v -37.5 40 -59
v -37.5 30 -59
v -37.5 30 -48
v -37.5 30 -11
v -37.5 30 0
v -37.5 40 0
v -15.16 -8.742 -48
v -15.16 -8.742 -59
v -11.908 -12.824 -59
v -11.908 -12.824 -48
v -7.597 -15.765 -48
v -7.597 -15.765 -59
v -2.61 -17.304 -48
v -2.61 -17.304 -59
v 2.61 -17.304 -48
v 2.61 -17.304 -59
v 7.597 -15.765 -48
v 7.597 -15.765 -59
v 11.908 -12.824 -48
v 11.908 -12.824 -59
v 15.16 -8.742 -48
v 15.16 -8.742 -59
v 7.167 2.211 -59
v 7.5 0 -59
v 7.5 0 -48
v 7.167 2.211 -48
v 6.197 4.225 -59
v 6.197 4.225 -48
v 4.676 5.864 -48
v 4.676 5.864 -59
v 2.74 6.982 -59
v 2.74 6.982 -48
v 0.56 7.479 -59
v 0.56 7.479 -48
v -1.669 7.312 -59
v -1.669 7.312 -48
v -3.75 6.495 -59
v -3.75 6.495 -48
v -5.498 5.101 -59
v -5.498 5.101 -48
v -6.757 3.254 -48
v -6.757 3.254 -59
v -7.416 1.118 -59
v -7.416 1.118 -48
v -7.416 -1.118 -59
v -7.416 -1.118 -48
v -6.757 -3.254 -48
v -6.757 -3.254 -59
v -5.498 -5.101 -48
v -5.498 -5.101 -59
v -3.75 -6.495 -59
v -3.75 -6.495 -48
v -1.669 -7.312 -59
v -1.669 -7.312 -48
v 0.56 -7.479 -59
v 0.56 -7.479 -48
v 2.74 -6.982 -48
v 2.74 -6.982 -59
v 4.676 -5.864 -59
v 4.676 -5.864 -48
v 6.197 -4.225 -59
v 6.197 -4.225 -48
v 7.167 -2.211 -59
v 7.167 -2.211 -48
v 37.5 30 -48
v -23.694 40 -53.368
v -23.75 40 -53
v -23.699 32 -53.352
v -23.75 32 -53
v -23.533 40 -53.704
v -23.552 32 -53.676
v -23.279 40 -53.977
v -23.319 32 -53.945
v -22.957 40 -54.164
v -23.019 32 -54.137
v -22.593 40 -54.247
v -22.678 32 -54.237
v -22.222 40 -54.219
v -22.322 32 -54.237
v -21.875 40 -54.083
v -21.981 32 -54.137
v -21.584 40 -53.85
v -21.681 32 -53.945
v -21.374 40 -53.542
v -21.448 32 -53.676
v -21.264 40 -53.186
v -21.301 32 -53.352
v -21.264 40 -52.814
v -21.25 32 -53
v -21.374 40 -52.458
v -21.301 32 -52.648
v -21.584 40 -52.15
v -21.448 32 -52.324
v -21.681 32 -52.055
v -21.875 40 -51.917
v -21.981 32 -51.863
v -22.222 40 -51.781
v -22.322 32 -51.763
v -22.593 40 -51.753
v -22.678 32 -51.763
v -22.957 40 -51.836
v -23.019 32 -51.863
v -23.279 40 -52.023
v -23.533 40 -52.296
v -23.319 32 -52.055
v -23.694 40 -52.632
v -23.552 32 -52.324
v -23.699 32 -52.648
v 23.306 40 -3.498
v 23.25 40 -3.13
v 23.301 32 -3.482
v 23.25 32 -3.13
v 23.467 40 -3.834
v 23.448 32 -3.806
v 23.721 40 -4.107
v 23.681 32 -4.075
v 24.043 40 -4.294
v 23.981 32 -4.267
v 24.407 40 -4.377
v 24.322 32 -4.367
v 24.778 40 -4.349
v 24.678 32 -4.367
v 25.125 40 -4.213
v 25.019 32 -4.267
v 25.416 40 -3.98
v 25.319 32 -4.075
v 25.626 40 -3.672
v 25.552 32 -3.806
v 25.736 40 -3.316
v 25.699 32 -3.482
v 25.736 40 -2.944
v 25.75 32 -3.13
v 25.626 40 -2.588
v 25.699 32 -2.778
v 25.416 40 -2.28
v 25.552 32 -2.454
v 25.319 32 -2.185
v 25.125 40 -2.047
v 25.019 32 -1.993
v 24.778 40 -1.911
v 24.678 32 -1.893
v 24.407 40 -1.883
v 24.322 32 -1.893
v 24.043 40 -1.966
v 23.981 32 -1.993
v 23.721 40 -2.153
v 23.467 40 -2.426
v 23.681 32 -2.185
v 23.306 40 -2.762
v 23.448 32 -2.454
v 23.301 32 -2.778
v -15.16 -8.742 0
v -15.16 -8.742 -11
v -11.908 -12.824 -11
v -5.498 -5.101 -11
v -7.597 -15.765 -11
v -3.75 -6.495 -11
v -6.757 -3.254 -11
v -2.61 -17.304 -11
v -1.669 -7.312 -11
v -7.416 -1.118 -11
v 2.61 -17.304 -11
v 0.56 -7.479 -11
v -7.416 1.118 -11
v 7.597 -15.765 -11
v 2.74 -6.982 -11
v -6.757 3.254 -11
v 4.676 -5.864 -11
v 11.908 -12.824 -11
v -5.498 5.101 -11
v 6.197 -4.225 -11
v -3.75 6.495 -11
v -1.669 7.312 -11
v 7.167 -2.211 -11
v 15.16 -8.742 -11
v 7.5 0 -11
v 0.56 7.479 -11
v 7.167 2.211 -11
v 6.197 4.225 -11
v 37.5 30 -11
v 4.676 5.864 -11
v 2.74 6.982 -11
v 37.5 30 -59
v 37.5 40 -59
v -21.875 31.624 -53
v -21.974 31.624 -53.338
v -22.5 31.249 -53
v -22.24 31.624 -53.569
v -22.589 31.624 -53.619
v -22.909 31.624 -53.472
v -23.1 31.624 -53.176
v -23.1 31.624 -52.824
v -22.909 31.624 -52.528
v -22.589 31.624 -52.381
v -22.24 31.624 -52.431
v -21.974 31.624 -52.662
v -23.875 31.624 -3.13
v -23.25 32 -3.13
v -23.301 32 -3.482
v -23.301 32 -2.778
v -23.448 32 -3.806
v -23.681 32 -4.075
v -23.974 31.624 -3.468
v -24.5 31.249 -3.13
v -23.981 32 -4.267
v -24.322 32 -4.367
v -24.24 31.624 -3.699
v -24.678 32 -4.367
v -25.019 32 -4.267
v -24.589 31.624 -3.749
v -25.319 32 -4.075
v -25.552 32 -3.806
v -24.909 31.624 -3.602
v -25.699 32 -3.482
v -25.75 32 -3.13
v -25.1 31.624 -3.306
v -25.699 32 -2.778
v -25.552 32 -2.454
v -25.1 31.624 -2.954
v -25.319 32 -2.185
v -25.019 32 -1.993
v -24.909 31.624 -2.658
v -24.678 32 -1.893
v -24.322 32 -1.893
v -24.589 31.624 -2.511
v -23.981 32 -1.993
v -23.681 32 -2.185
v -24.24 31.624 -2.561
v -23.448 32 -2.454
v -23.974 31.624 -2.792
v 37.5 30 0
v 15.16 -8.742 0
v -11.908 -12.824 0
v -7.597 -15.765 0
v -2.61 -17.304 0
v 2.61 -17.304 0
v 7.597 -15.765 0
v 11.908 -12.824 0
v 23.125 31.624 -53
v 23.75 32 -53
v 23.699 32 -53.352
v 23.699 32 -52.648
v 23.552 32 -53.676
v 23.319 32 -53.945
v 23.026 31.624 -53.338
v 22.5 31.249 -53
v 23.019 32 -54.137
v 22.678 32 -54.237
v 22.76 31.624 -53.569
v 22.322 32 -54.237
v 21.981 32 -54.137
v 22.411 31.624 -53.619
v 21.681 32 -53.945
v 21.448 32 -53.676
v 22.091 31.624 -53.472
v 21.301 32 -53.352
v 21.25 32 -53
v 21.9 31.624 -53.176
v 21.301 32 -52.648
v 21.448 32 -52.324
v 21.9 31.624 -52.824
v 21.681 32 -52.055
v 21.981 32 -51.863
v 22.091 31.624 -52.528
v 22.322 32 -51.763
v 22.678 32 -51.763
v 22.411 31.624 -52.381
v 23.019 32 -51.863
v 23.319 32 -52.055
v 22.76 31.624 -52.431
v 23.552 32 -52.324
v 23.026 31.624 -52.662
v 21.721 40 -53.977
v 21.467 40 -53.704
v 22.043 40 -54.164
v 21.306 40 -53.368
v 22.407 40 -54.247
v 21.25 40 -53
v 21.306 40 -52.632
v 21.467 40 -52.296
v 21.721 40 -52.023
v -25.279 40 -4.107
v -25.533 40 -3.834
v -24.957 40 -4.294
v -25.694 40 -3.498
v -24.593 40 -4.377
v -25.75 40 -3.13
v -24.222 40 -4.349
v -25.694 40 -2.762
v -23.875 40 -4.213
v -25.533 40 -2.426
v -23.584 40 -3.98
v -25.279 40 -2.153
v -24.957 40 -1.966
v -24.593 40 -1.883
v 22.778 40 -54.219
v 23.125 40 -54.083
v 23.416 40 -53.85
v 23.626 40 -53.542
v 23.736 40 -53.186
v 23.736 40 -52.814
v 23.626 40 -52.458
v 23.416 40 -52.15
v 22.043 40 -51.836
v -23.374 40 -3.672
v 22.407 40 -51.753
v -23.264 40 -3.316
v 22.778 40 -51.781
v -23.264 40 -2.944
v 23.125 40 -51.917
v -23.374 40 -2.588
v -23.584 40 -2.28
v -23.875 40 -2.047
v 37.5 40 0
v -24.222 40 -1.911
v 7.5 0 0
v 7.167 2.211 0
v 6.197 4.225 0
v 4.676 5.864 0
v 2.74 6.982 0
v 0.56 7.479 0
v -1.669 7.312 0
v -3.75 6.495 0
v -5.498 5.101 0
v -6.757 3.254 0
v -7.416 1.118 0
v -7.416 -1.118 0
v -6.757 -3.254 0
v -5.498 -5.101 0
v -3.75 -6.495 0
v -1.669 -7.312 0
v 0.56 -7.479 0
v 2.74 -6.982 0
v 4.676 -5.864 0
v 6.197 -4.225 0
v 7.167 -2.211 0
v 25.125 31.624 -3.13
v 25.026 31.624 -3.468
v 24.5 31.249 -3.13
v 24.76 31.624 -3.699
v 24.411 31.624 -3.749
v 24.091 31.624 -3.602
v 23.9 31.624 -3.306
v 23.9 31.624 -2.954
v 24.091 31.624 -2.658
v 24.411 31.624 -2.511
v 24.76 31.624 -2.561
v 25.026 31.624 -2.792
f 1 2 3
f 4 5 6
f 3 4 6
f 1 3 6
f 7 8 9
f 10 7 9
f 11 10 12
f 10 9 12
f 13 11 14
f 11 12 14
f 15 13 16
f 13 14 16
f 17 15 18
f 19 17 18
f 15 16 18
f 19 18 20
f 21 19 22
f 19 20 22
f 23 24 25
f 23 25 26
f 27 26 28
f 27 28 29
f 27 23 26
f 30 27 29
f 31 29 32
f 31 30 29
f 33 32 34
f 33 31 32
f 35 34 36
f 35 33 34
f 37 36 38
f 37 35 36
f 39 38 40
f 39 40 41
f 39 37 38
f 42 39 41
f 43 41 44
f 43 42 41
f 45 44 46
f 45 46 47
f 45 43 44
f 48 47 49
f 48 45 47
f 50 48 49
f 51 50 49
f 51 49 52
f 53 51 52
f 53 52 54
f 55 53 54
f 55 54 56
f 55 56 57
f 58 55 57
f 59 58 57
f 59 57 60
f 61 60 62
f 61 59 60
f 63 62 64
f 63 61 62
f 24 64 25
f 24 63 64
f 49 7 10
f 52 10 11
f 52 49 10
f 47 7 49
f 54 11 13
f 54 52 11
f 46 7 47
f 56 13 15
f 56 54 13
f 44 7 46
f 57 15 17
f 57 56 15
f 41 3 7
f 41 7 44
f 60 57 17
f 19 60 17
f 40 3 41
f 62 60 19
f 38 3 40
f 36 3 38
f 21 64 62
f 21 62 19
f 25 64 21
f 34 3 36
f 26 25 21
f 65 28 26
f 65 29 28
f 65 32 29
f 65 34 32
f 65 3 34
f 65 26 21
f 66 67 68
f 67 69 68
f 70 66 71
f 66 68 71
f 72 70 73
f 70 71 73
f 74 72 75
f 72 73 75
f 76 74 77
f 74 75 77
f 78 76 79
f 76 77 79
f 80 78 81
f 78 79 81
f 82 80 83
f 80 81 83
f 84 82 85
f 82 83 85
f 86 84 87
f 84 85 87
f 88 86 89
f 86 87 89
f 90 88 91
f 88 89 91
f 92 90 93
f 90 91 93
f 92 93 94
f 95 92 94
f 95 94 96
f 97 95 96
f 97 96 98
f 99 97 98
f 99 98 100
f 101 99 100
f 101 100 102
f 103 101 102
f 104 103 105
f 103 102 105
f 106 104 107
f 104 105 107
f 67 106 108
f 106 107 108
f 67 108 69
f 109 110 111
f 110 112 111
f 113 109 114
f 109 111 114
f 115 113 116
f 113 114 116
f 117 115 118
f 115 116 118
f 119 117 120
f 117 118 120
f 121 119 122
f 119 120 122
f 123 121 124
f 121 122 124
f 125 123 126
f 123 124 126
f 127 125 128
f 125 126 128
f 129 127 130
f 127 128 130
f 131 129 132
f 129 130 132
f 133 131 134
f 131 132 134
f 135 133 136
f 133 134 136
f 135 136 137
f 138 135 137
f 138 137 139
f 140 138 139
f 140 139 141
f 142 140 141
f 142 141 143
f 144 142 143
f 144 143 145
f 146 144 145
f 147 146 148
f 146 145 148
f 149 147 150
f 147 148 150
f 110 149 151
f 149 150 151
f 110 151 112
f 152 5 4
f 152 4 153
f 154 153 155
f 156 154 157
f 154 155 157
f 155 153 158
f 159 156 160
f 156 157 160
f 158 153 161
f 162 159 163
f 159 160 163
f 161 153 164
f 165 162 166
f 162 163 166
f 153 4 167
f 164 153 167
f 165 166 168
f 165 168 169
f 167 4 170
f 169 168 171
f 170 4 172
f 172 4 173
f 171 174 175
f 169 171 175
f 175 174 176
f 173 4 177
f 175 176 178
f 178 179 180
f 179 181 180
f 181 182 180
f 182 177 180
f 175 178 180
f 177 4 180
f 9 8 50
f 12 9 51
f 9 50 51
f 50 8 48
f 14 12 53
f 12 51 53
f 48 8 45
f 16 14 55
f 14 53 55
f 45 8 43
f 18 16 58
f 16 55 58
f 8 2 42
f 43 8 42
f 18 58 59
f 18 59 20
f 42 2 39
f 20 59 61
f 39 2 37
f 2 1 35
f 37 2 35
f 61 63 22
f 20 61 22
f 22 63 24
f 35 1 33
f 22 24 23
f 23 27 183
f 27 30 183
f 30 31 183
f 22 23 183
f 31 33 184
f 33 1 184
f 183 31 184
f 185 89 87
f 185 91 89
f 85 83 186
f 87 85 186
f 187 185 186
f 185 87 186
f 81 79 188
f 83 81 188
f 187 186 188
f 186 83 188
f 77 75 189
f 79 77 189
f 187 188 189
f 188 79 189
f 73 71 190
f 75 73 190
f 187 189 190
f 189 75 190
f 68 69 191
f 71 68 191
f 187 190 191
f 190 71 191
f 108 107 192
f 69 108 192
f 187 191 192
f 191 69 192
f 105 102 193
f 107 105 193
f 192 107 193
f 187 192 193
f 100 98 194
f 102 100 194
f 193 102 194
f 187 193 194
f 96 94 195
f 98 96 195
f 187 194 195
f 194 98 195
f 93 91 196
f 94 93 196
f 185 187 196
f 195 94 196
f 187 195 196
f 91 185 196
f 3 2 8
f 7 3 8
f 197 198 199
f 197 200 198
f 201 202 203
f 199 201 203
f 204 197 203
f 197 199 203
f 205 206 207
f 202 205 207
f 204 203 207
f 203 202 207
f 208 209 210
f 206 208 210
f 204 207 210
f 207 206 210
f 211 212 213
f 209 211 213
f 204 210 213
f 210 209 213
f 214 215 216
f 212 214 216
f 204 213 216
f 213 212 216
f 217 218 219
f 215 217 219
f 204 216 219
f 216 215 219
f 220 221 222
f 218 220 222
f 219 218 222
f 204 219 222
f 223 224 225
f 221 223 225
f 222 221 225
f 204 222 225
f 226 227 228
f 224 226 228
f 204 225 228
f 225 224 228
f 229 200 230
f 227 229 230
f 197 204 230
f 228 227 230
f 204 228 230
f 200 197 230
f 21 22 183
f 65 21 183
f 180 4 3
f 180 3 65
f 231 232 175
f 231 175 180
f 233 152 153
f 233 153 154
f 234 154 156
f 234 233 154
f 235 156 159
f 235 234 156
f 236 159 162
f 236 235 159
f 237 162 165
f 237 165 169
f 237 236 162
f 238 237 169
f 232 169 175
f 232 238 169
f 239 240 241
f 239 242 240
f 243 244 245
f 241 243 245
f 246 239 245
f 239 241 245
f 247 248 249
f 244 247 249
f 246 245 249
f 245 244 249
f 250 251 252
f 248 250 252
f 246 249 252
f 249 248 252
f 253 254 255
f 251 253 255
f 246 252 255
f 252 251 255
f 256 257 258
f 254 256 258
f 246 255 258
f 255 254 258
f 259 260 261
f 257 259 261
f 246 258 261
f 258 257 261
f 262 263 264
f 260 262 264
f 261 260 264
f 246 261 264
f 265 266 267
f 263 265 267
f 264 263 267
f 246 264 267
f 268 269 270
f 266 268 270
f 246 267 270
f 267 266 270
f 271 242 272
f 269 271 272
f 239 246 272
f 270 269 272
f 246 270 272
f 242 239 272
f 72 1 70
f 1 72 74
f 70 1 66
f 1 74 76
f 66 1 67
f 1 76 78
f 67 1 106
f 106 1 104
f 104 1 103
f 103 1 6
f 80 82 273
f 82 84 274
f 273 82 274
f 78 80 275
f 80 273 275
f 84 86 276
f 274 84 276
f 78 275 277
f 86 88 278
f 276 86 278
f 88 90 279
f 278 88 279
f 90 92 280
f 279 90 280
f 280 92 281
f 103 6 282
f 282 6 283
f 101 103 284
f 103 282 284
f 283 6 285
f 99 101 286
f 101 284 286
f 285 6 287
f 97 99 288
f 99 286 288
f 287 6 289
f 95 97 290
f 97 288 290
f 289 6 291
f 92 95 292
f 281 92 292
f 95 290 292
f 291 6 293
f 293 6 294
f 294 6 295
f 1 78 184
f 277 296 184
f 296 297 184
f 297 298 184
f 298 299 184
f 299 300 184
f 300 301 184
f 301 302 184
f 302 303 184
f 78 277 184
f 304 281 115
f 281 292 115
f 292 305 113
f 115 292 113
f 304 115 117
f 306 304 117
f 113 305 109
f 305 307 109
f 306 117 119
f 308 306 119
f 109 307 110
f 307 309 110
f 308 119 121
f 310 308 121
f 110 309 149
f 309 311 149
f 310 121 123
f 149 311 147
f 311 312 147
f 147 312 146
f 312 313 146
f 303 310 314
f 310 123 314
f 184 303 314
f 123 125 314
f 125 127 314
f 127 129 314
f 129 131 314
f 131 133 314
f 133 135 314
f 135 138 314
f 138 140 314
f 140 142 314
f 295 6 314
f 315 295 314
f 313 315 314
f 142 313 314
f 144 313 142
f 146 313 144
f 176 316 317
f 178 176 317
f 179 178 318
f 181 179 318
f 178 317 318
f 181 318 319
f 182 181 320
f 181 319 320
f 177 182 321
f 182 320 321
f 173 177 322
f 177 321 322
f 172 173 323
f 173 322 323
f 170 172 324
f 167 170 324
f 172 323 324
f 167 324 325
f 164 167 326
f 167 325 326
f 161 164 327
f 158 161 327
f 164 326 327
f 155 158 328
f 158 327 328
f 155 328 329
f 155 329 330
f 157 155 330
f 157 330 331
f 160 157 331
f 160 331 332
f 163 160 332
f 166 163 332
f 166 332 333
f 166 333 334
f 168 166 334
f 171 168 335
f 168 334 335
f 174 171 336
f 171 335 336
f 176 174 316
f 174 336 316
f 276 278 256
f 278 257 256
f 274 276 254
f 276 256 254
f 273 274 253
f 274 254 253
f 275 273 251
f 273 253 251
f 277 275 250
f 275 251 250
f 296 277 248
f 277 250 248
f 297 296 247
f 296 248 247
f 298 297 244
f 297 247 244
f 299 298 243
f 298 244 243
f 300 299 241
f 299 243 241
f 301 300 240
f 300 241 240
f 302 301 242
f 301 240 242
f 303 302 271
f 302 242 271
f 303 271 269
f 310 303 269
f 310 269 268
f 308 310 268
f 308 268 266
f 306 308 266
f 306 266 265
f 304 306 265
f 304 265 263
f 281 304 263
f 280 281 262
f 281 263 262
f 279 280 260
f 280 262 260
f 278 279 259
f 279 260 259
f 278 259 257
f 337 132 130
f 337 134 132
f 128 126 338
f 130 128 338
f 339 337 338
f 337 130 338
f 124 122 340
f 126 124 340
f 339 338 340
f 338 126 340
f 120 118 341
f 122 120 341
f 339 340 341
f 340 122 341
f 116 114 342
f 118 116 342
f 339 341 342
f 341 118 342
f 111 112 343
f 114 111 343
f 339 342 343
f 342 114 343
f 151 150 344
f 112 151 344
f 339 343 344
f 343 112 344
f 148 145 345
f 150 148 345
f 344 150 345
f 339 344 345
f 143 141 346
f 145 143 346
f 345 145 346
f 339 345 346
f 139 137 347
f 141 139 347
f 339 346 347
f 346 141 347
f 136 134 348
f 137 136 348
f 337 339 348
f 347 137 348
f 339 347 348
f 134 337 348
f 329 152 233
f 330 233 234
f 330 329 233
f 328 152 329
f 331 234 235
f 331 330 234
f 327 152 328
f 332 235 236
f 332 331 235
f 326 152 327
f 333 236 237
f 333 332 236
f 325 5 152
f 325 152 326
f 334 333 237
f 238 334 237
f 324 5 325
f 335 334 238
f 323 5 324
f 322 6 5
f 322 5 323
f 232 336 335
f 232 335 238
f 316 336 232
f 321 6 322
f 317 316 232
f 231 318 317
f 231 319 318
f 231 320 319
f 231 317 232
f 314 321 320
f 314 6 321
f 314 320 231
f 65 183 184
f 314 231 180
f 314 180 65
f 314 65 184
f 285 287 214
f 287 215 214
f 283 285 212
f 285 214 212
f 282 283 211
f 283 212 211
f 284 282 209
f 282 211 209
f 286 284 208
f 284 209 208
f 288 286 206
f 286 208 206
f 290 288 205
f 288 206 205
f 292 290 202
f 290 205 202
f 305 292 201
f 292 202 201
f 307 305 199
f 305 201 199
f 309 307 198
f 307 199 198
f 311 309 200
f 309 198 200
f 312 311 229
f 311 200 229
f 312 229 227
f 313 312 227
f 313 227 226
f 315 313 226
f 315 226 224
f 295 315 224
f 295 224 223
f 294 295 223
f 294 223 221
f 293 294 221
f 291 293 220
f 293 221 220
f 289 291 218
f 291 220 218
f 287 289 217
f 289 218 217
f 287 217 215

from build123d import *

# Parameters (mm, degrees)
SKETCH1_R                       = 7.5
BOSS_EXTRUDE1_DEPTH             = 11
SKETCH1_3_W                     = 75
SKETCH1_3_H                     = 10
BOSS_EXTRUDE2_DEPTH             = 59
TAP_DRILL_FOR_M3X0_5_TAP1_D     = 2.5
TAP_DRILL_FOR_M3X0_5_TAP1_DEPTH = 8
TAP_DRILL_FOR_M3X0_5_TAP1_TIP   = 0.751075774


with BuildPart() as part:
    # Sketch1 → Boss-Extrude1 (new body)
    with BuildSketch(Plane.XY):
        with BuildLine():
            Line((37.5, 30), (-37.5, 30))
            Line((-37.5, 30), (-15.160146889, -8.741850278))
            ThreePointArc((-15.160146889, -8.741850278), (0, -17.5), (15.160146889, -8.741850278))
            Line((15.160146889, -8.741850278), (37.5, 30))
        make_face()
        Circle(SKETCH1_R, mode=Mode.SUBTRACT)
    boss_extrude1 = extrude(amount=-BOSS_EXTRUDE1_DEPTH)

    # Sketch1<3> → Boss-Extrude2 (add)
    with BuildSketch(Plane.XY):
        with Locations((0, 35)):
            Rectangle(SKETCH1_3_W, SKETCH1_3_H)
    extrude(amount=-BOSS_EXTRUDE2_DEPTH)

    # Mirror2: Boss-Extrude1 across plane
    add(boss_extrude1.mirror(Plane.XY.offset(-29.5)))

    # Tap Drill for M3x0.5 Tap1
    with Locations(Plane(origin=(0, 40, 0), x_dir=(1, 0, 0), z_dir=(0, 1, 0))):
        with Locations((-22.5, 53), (22.5, 53), (-24.5, 3.13), (24.5, 3.13)):
            Hole(TAP_DRILL_FOR_M3X0_5_TAP1_D / 2, depth=TAP_DRILL_FOR_M3X0_5_TAP1_DEPTH)
            with Locations((0, 0, -(TAP_DRILL_FOR_M3X0_5_TAP1_DEPTH + TAP_DRILL_FOR_M3X0_5_TAP1_TIP / 2))):  # 118° drill point
                Cone(0, TAP_DRILL_FOR_M3X0_5_TAP1_D / 2, TAP_DRILL_FOR_M3X0_5_TAP1_TIP, mode=Mode.SUBTRACT)


solid = part.part
